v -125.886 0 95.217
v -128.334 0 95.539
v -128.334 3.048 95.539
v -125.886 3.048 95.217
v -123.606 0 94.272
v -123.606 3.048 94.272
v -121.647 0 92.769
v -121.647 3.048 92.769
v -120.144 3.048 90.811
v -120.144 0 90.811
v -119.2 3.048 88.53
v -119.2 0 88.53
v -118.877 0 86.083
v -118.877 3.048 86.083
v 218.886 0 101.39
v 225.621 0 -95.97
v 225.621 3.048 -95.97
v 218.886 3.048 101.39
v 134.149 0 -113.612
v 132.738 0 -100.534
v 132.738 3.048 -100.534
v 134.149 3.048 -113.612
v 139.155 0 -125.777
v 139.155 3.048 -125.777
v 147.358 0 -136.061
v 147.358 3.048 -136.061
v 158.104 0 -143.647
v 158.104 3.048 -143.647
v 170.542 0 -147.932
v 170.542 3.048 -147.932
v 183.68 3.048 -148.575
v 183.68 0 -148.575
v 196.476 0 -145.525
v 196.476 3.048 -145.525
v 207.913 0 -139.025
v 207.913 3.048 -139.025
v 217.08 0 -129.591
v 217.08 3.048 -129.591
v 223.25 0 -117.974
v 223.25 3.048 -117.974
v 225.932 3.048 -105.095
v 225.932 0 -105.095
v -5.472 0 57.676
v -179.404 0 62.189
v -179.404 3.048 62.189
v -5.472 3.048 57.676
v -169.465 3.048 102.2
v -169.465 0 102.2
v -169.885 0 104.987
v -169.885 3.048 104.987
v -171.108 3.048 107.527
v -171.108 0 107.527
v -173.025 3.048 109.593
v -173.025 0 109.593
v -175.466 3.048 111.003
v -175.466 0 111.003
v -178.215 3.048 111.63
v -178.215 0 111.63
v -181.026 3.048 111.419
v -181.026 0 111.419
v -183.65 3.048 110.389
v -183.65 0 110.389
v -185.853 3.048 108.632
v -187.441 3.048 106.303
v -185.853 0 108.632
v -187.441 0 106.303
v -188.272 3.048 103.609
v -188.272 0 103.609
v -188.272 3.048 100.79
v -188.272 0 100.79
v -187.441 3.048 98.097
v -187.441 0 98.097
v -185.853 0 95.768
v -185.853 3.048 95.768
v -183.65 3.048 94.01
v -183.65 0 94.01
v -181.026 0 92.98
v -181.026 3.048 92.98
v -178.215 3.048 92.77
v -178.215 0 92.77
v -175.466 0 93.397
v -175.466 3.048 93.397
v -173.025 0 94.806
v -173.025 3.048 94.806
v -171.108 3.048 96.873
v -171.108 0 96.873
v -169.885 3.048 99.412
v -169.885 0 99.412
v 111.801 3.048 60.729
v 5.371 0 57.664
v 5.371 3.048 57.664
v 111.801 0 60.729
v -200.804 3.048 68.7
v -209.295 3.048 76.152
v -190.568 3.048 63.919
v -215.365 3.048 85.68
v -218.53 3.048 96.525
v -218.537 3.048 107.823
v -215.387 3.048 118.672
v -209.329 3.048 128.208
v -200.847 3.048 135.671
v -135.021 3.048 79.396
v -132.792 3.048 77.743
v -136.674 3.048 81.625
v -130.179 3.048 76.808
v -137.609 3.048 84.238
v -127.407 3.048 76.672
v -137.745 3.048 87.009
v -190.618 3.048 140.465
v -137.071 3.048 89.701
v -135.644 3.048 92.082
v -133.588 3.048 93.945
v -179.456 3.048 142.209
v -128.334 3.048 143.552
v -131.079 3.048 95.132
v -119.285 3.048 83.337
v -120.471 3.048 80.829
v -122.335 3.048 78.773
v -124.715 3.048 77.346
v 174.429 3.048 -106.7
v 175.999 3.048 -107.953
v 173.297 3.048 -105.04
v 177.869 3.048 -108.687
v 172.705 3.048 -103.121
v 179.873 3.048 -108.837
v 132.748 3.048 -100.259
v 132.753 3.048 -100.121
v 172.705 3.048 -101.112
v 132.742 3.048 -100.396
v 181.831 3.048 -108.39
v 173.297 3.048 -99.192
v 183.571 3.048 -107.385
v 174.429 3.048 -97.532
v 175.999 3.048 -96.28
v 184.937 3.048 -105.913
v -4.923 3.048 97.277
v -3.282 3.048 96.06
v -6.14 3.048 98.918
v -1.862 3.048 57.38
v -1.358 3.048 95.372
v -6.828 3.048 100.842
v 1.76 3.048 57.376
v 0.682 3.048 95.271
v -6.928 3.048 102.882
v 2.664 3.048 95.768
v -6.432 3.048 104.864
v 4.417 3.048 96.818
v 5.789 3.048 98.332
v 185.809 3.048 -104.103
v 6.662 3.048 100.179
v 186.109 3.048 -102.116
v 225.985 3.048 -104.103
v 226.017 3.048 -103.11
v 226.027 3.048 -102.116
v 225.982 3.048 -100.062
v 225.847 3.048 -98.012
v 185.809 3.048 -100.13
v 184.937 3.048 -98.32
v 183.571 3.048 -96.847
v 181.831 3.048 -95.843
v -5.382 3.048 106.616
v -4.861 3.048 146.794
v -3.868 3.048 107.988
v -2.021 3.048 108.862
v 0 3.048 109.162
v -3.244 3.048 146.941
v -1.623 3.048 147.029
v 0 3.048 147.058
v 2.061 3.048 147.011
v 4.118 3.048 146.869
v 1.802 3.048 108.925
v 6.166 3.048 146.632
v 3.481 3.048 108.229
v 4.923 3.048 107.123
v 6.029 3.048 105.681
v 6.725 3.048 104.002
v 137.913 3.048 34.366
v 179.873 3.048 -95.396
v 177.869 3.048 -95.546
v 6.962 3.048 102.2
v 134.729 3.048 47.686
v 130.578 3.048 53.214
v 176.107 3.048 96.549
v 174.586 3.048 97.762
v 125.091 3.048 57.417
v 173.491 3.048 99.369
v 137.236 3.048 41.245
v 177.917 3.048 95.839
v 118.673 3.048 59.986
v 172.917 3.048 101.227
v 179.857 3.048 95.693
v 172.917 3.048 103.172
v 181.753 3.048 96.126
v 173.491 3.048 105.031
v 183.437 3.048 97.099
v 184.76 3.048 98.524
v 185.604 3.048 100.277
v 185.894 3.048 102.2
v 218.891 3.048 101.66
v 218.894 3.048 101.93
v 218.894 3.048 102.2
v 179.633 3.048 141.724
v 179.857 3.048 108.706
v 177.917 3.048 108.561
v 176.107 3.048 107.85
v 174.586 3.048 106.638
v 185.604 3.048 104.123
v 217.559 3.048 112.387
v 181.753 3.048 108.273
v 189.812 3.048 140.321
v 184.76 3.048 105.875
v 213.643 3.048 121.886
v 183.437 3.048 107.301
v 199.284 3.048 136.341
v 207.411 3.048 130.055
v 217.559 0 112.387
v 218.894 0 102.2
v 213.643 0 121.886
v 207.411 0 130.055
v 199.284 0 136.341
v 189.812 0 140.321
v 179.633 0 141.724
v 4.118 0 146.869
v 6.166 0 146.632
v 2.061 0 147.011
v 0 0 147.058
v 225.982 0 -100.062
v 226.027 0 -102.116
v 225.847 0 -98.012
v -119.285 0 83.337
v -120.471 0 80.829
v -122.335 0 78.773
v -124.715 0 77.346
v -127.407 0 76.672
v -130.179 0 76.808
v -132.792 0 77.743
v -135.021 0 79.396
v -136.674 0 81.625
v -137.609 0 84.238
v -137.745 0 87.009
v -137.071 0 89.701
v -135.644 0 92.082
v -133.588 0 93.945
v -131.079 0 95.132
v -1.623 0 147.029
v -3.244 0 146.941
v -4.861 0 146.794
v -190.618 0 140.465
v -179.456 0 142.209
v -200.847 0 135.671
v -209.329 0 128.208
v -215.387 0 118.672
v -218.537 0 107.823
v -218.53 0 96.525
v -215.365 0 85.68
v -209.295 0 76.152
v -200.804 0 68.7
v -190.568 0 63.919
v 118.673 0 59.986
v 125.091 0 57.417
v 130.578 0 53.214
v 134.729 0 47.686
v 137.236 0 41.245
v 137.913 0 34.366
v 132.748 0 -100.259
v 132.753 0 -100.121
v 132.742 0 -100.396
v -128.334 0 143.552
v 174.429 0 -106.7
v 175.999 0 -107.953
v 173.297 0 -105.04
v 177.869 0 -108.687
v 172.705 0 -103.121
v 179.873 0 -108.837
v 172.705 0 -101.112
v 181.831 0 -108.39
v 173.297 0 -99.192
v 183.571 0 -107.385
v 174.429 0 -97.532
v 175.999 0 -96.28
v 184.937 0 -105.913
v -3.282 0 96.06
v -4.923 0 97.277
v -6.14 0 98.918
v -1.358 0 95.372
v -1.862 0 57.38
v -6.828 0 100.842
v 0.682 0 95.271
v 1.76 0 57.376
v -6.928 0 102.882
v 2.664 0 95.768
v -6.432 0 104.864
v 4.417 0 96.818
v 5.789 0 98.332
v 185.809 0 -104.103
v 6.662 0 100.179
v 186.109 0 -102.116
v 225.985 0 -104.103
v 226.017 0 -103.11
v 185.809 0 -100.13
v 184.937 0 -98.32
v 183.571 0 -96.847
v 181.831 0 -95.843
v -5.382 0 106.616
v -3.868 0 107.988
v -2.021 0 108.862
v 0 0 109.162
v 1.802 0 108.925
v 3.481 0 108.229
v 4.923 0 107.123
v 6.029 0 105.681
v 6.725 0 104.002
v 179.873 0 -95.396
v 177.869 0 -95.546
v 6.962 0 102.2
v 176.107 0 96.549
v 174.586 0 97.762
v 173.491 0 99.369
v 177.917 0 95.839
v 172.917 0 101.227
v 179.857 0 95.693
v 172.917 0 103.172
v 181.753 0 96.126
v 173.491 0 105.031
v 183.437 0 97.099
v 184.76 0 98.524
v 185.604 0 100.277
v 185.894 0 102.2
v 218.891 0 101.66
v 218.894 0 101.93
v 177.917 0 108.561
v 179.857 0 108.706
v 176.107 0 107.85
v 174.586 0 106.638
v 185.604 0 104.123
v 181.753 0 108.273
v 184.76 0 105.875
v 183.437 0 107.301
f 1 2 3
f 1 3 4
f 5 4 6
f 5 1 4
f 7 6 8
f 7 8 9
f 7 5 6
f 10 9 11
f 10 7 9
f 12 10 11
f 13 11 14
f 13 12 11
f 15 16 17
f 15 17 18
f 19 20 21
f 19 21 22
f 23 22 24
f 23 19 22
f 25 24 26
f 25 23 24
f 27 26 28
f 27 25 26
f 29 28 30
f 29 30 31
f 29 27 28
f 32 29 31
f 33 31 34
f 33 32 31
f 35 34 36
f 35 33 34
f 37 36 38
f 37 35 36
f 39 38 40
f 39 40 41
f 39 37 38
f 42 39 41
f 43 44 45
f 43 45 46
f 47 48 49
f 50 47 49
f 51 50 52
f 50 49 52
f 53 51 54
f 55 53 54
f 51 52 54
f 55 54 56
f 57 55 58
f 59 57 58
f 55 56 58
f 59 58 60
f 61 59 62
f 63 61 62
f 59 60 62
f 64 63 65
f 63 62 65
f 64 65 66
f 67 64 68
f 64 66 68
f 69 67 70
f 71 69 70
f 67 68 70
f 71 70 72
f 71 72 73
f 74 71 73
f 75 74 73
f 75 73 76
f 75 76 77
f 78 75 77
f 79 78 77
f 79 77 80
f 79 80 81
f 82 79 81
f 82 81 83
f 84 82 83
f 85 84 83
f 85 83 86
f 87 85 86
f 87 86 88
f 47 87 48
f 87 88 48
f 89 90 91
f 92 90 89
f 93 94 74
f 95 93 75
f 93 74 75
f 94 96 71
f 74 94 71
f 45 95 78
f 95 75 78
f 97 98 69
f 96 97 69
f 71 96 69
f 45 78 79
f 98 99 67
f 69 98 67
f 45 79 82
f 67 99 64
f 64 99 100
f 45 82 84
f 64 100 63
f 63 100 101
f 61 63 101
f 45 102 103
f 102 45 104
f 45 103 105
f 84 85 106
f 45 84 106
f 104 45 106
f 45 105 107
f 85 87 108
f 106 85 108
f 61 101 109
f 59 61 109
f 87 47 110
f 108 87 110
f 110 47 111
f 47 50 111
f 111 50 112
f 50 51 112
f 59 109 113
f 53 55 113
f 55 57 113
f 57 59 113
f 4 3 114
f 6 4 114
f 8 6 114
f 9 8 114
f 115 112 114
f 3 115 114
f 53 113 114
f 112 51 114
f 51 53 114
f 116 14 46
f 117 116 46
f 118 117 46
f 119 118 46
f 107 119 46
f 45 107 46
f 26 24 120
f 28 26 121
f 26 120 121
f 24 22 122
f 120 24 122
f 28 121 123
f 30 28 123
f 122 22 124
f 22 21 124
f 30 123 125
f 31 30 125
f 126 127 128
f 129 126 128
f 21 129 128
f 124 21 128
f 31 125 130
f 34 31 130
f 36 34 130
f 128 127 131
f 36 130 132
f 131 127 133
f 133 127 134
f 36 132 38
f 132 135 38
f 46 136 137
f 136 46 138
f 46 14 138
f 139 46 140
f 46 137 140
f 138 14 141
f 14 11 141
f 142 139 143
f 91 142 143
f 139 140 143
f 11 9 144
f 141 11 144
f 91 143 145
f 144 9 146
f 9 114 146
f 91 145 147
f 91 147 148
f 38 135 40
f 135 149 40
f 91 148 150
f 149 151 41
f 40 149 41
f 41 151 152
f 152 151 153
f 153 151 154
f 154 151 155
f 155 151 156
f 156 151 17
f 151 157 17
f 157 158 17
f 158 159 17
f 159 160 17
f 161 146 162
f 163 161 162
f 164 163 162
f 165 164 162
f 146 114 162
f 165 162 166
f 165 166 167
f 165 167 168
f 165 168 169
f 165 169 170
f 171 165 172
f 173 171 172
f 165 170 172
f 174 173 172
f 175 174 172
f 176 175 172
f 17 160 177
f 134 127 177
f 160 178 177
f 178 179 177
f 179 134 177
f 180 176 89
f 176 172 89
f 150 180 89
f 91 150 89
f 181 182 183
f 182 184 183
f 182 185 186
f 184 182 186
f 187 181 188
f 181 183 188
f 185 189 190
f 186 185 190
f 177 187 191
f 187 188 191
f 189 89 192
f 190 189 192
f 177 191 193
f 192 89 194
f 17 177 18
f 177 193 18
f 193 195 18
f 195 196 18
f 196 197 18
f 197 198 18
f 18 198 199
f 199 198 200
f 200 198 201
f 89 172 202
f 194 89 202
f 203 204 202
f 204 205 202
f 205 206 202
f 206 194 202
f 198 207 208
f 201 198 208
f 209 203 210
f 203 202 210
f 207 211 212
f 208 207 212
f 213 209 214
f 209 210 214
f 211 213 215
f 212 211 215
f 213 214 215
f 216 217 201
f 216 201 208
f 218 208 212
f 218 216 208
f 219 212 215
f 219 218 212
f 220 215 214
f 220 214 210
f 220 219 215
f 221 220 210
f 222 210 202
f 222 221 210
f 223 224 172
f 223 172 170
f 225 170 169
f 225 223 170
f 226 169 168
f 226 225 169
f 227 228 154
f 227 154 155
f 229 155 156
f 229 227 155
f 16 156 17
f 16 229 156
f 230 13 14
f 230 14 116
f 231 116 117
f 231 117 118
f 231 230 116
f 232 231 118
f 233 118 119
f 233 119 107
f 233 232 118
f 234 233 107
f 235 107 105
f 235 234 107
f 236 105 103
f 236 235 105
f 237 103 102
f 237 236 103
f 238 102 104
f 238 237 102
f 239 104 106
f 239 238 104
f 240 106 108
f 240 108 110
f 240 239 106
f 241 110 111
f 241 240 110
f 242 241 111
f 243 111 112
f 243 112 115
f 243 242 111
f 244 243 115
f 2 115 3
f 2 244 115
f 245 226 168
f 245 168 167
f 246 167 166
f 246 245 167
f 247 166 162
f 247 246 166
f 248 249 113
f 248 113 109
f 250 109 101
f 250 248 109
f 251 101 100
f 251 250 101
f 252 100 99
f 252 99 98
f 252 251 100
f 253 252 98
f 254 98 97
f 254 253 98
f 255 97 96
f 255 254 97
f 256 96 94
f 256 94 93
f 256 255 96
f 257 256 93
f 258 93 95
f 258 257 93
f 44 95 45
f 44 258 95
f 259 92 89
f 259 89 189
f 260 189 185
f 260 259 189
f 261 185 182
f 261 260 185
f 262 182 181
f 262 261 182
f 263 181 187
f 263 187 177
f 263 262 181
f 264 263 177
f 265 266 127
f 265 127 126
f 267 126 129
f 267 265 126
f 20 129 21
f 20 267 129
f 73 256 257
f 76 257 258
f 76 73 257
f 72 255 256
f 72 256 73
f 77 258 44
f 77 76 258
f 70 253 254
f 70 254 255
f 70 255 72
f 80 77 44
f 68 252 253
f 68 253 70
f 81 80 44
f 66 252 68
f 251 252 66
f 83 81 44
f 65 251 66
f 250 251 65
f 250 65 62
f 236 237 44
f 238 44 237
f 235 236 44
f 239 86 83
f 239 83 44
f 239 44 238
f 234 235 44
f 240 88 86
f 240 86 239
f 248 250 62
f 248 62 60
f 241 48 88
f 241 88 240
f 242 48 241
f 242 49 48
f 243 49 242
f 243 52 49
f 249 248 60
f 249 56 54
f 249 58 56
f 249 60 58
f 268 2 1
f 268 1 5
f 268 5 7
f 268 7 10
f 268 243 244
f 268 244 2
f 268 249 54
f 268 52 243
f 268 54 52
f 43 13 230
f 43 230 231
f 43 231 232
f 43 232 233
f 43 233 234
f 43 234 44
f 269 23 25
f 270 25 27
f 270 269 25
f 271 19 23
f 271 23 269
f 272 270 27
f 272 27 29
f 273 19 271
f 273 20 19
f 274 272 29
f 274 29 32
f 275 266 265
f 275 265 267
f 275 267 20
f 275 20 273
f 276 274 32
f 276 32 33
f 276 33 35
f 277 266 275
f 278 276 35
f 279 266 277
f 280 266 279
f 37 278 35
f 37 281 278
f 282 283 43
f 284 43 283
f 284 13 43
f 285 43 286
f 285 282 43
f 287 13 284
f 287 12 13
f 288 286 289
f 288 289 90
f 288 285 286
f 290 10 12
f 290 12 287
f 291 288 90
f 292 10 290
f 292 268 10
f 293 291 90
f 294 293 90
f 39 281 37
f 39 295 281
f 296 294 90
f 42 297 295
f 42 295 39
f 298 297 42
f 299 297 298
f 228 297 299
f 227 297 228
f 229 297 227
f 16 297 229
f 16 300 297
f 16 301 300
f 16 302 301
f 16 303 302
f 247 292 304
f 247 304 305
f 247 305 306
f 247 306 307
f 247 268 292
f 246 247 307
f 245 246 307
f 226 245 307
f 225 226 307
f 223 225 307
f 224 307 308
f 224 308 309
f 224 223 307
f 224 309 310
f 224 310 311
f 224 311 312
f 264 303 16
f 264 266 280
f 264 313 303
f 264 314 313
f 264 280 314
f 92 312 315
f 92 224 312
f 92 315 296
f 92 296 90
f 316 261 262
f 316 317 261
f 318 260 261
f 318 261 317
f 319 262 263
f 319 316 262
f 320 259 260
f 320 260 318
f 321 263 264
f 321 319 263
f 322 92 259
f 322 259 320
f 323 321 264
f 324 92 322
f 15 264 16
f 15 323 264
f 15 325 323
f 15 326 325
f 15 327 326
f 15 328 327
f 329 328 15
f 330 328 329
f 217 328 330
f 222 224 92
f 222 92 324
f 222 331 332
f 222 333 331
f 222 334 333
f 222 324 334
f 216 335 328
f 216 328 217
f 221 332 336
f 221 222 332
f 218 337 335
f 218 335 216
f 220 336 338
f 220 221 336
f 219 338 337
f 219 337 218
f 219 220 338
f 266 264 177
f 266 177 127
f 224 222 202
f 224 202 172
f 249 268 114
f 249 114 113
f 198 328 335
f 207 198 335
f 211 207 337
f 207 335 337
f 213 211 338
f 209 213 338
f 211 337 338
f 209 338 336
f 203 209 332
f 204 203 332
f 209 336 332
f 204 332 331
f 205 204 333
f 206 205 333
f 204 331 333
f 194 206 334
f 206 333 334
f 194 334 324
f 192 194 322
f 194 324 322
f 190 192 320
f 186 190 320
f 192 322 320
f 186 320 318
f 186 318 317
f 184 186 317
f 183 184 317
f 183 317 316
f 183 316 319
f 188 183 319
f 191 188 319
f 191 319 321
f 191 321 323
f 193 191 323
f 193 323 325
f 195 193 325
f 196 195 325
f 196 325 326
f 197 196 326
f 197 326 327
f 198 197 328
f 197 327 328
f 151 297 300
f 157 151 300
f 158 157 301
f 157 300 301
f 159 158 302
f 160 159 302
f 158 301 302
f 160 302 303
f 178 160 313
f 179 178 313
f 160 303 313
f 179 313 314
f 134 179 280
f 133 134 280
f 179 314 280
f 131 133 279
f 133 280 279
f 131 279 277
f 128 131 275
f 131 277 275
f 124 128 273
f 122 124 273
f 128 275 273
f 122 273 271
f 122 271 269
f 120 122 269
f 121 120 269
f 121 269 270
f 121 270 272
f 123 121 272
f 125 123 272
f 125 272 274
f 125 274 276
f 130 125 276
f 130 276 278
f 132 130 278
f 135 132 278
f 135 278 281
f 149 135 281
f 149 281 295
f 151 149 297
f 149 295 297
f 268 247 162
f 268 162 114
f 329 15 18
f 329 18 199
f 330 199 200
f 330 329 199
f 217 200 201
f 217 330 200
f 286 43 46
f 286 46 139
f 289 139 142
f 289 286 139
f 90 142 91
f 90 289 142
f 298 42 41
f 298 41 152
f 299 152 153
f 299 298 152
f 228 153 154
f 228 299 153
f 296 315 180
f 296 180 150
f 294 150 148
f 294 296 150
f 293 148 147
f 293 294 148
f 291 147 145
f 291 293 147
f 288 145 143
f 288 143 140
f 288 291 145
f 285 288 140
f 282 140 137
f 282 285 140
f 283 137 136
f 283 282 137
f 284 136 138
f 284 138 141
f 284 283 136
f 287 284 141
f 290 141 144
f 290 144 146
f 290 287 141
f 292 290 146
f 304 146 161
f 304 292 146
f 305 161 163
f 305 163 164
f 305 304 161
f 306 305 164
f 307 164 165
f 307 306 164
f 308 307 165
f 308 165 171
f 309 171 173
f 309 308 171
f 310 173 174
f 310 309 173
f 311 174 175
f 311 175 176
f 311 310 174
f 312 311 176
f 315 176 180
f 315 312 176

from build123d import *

# Parameters (mm, degrees)
F0_R     = 9.45647
F0_R_2   = 6.524703
F0_R_3   = 6.739392
F1_DEPTH = 3.048


with BuildPart() as f1:
    # F0 (on Front) → F1 (new body)
    with BuildSketch(Plane.XZ):
        with BuildLine():
            ThreePointArc((-179.40379, 62.189409), (-150.798722, 73.736031), (-138.907989, 102.199778))
            ThreePointArc((-138.907989, 102.199778), (-150.817251, 130.681819), (-179.455864, 142.209485))
            ThreePointArc((-179.455864, 142.209485), (-218.934537, 102.173739), (-179.40379, 62.189409))
        make_face()
        with Locations((-178.921267, 102.199778)):
            Circle(F0_R, mode=Mode.SUBTRACT)
        with BuildLine():
            ThreePointArc((-118.877397, 86.082518), (-121.647133, 92.769252), (-128.333867, 95.538988))
            ThreePointArc((-128.333867, 95.538988), (-135.020601, 79.395784), (-118.877397, 86.082518))
        make_face()
        with BuildLine():
            ThreePointArc((-179.455864, 142.209485), (-150.817251, 130.681819), (-138.907989, 102.199778))
            ThreePointArc((-138.907989, 102.199778), (-150.798722, 73.736031), (-179.40379, 62.189409))
            Line((-179.40379, 62.189409), (-5.47156, 57.676359))
            ThreePointArc((-5.47156, 57.676359), (-44.85731, 102.507285), (-4.860639, 146.794027))
            Line((-4.860639, 146.794027), (-128.333867, 143.551852))
            Line((-128.333867, 143.551852), (-179.455864, 142.209485))
        make_face()
        with BuildLine():
            ThreePointArc((-118.877397, 86.082518), (-135.020601, 79.395784), (-128.333867, 95.538988))
            ThreePointArc((-128.333867, 95.538988), (-121.647133, 92.769252), (-118.877397, 86.082518))
        make_face(mode=Mode.SUBTRACT)
        with BuildLine():
            ThreePointArc((6.962021, 102.199778), (4.922892, 107.12267), (0, 109.161799))
            ThreePointArc((0, 109.161799), (-4.922892, 97.276886), (6.962021, 102.199778))
        make_face()
        with BuildLine():
            ThreePointArc((-4.860639, 146.794027), (-44.85731, 102.507285), (-5.47156, 57.676359))
            ThreePointArc((-5.47156, 57.676359), (-0.050681, 57.341443), (5.370942, 57.664109))
            ThreePointArc((5.370942, 57.664109), (33.564896, 72.43956), (44.858364, 102.199778))
            ThreePointArc((44.858364, 102.199778), (33.829583, 131.658769), (6.166263, 146.632311))
            ThreePointArc((6.166263, 146.632311), (3.090475, 146.951558), (0, 147.058142))
            ThreePointArc((0, 147.058142), (-2.433904, 146.992064), (-4.860639, 146.794027))
        make_face()
        with BuildLine():
            ThreePointArc((6.962021, 102.199778), (-4.922892, 97.276886), (0, 109.161799))
            ThreePointArc((0, 109.161799), (4.922892, 107.12267), (6.962021, 102.199778))
        make_face(mode=Mode.SUBTRACT)
        with BuildLine():
            ThreePointArc((44.858364, 102.199778), (33.564896, 72.43956), (5.370942, 57.664109))
            Line((5.370942, 57.664109), (111.800854, 60.728798))
            ThreePointArc((111.800854, 60.728798), (130.578116, 53.213773), (137.91328, 34.365522))
            Line((137.91328, 34.365522), (132.753456, -100.121289))
            ThreePointArc((132.753456, -100.121289), (177.285619, -55.504586), (225.62088, -95.970205))
            Line((225.62088, -95.970205), (218.886154, 101.390041))
            ThreePointArc((218.886154, 101.390041), (151.043311, 74.633496), (179.633495, 141.724221))
            Line((179.633495, 141.724221), (6.166263, 146.632311))
            ThreePointArc((6.166263, 146.632311), (33.829583, 131.658769), (44.858364, 102.199778))
        make_face()
        with BuildLine():
            ThreePointArc((218.894449, 102.199778), (207.411063, 130.054778), (179.633495, 141.724221))
            ThreePointArc((179.633495, 141.724221), (151.043311, 74.633496), (218.886154, 101.390041))
            ThreePointArc((218.886154, 101.390041), (218.892375, 101.794888), (218.894449, 102.199778))
        make_face()
        with Locations((179.369122, 102.199778)):
            Circle(F0_R_2, mode=Mode.SUBTRACT)
        with BuildLine():
            Line((132.737626, -100.533887), (132.753456, -100.121289))
            ThreePointArc((132.753456, -100.121289), (132.745085, -100.32757), (132.737626, -100.533887))
        make_face()
        with BuildLine():
            ThreePointArc((225.62088, -95.970205), (177.285619, -55.504586), (132.753456, -100.121289))
            Line((132.753456, -100.121289), (132.737626, -100.533887))
            ThreePointArc((132.737626, -100.533887), (177.088137, -148.718935), (225.932267, -105.095344))
            Line((225.932267, -105.095344), (225.62088, -95.970205))
        make_face()
        with Locations((179.369122, -102.116384)):
            Circle(F0_R_3, mode=Mode.SUBTRACT)
        with BuildLine():
            ThreePointArc((226.027461, -102.116384), (225.925705, -99.036578), (225.62088, -95.970205))
            Line((225.62088, -95.970205), (225.932267, -105.095344))
            ThreePointArc((225.932267, -105.095344), (226.003657, -103.606624), (226.027461, -102.116384))
        make_face()
    extrude(amount=-F1_DEPTH)


solid = f1.part
